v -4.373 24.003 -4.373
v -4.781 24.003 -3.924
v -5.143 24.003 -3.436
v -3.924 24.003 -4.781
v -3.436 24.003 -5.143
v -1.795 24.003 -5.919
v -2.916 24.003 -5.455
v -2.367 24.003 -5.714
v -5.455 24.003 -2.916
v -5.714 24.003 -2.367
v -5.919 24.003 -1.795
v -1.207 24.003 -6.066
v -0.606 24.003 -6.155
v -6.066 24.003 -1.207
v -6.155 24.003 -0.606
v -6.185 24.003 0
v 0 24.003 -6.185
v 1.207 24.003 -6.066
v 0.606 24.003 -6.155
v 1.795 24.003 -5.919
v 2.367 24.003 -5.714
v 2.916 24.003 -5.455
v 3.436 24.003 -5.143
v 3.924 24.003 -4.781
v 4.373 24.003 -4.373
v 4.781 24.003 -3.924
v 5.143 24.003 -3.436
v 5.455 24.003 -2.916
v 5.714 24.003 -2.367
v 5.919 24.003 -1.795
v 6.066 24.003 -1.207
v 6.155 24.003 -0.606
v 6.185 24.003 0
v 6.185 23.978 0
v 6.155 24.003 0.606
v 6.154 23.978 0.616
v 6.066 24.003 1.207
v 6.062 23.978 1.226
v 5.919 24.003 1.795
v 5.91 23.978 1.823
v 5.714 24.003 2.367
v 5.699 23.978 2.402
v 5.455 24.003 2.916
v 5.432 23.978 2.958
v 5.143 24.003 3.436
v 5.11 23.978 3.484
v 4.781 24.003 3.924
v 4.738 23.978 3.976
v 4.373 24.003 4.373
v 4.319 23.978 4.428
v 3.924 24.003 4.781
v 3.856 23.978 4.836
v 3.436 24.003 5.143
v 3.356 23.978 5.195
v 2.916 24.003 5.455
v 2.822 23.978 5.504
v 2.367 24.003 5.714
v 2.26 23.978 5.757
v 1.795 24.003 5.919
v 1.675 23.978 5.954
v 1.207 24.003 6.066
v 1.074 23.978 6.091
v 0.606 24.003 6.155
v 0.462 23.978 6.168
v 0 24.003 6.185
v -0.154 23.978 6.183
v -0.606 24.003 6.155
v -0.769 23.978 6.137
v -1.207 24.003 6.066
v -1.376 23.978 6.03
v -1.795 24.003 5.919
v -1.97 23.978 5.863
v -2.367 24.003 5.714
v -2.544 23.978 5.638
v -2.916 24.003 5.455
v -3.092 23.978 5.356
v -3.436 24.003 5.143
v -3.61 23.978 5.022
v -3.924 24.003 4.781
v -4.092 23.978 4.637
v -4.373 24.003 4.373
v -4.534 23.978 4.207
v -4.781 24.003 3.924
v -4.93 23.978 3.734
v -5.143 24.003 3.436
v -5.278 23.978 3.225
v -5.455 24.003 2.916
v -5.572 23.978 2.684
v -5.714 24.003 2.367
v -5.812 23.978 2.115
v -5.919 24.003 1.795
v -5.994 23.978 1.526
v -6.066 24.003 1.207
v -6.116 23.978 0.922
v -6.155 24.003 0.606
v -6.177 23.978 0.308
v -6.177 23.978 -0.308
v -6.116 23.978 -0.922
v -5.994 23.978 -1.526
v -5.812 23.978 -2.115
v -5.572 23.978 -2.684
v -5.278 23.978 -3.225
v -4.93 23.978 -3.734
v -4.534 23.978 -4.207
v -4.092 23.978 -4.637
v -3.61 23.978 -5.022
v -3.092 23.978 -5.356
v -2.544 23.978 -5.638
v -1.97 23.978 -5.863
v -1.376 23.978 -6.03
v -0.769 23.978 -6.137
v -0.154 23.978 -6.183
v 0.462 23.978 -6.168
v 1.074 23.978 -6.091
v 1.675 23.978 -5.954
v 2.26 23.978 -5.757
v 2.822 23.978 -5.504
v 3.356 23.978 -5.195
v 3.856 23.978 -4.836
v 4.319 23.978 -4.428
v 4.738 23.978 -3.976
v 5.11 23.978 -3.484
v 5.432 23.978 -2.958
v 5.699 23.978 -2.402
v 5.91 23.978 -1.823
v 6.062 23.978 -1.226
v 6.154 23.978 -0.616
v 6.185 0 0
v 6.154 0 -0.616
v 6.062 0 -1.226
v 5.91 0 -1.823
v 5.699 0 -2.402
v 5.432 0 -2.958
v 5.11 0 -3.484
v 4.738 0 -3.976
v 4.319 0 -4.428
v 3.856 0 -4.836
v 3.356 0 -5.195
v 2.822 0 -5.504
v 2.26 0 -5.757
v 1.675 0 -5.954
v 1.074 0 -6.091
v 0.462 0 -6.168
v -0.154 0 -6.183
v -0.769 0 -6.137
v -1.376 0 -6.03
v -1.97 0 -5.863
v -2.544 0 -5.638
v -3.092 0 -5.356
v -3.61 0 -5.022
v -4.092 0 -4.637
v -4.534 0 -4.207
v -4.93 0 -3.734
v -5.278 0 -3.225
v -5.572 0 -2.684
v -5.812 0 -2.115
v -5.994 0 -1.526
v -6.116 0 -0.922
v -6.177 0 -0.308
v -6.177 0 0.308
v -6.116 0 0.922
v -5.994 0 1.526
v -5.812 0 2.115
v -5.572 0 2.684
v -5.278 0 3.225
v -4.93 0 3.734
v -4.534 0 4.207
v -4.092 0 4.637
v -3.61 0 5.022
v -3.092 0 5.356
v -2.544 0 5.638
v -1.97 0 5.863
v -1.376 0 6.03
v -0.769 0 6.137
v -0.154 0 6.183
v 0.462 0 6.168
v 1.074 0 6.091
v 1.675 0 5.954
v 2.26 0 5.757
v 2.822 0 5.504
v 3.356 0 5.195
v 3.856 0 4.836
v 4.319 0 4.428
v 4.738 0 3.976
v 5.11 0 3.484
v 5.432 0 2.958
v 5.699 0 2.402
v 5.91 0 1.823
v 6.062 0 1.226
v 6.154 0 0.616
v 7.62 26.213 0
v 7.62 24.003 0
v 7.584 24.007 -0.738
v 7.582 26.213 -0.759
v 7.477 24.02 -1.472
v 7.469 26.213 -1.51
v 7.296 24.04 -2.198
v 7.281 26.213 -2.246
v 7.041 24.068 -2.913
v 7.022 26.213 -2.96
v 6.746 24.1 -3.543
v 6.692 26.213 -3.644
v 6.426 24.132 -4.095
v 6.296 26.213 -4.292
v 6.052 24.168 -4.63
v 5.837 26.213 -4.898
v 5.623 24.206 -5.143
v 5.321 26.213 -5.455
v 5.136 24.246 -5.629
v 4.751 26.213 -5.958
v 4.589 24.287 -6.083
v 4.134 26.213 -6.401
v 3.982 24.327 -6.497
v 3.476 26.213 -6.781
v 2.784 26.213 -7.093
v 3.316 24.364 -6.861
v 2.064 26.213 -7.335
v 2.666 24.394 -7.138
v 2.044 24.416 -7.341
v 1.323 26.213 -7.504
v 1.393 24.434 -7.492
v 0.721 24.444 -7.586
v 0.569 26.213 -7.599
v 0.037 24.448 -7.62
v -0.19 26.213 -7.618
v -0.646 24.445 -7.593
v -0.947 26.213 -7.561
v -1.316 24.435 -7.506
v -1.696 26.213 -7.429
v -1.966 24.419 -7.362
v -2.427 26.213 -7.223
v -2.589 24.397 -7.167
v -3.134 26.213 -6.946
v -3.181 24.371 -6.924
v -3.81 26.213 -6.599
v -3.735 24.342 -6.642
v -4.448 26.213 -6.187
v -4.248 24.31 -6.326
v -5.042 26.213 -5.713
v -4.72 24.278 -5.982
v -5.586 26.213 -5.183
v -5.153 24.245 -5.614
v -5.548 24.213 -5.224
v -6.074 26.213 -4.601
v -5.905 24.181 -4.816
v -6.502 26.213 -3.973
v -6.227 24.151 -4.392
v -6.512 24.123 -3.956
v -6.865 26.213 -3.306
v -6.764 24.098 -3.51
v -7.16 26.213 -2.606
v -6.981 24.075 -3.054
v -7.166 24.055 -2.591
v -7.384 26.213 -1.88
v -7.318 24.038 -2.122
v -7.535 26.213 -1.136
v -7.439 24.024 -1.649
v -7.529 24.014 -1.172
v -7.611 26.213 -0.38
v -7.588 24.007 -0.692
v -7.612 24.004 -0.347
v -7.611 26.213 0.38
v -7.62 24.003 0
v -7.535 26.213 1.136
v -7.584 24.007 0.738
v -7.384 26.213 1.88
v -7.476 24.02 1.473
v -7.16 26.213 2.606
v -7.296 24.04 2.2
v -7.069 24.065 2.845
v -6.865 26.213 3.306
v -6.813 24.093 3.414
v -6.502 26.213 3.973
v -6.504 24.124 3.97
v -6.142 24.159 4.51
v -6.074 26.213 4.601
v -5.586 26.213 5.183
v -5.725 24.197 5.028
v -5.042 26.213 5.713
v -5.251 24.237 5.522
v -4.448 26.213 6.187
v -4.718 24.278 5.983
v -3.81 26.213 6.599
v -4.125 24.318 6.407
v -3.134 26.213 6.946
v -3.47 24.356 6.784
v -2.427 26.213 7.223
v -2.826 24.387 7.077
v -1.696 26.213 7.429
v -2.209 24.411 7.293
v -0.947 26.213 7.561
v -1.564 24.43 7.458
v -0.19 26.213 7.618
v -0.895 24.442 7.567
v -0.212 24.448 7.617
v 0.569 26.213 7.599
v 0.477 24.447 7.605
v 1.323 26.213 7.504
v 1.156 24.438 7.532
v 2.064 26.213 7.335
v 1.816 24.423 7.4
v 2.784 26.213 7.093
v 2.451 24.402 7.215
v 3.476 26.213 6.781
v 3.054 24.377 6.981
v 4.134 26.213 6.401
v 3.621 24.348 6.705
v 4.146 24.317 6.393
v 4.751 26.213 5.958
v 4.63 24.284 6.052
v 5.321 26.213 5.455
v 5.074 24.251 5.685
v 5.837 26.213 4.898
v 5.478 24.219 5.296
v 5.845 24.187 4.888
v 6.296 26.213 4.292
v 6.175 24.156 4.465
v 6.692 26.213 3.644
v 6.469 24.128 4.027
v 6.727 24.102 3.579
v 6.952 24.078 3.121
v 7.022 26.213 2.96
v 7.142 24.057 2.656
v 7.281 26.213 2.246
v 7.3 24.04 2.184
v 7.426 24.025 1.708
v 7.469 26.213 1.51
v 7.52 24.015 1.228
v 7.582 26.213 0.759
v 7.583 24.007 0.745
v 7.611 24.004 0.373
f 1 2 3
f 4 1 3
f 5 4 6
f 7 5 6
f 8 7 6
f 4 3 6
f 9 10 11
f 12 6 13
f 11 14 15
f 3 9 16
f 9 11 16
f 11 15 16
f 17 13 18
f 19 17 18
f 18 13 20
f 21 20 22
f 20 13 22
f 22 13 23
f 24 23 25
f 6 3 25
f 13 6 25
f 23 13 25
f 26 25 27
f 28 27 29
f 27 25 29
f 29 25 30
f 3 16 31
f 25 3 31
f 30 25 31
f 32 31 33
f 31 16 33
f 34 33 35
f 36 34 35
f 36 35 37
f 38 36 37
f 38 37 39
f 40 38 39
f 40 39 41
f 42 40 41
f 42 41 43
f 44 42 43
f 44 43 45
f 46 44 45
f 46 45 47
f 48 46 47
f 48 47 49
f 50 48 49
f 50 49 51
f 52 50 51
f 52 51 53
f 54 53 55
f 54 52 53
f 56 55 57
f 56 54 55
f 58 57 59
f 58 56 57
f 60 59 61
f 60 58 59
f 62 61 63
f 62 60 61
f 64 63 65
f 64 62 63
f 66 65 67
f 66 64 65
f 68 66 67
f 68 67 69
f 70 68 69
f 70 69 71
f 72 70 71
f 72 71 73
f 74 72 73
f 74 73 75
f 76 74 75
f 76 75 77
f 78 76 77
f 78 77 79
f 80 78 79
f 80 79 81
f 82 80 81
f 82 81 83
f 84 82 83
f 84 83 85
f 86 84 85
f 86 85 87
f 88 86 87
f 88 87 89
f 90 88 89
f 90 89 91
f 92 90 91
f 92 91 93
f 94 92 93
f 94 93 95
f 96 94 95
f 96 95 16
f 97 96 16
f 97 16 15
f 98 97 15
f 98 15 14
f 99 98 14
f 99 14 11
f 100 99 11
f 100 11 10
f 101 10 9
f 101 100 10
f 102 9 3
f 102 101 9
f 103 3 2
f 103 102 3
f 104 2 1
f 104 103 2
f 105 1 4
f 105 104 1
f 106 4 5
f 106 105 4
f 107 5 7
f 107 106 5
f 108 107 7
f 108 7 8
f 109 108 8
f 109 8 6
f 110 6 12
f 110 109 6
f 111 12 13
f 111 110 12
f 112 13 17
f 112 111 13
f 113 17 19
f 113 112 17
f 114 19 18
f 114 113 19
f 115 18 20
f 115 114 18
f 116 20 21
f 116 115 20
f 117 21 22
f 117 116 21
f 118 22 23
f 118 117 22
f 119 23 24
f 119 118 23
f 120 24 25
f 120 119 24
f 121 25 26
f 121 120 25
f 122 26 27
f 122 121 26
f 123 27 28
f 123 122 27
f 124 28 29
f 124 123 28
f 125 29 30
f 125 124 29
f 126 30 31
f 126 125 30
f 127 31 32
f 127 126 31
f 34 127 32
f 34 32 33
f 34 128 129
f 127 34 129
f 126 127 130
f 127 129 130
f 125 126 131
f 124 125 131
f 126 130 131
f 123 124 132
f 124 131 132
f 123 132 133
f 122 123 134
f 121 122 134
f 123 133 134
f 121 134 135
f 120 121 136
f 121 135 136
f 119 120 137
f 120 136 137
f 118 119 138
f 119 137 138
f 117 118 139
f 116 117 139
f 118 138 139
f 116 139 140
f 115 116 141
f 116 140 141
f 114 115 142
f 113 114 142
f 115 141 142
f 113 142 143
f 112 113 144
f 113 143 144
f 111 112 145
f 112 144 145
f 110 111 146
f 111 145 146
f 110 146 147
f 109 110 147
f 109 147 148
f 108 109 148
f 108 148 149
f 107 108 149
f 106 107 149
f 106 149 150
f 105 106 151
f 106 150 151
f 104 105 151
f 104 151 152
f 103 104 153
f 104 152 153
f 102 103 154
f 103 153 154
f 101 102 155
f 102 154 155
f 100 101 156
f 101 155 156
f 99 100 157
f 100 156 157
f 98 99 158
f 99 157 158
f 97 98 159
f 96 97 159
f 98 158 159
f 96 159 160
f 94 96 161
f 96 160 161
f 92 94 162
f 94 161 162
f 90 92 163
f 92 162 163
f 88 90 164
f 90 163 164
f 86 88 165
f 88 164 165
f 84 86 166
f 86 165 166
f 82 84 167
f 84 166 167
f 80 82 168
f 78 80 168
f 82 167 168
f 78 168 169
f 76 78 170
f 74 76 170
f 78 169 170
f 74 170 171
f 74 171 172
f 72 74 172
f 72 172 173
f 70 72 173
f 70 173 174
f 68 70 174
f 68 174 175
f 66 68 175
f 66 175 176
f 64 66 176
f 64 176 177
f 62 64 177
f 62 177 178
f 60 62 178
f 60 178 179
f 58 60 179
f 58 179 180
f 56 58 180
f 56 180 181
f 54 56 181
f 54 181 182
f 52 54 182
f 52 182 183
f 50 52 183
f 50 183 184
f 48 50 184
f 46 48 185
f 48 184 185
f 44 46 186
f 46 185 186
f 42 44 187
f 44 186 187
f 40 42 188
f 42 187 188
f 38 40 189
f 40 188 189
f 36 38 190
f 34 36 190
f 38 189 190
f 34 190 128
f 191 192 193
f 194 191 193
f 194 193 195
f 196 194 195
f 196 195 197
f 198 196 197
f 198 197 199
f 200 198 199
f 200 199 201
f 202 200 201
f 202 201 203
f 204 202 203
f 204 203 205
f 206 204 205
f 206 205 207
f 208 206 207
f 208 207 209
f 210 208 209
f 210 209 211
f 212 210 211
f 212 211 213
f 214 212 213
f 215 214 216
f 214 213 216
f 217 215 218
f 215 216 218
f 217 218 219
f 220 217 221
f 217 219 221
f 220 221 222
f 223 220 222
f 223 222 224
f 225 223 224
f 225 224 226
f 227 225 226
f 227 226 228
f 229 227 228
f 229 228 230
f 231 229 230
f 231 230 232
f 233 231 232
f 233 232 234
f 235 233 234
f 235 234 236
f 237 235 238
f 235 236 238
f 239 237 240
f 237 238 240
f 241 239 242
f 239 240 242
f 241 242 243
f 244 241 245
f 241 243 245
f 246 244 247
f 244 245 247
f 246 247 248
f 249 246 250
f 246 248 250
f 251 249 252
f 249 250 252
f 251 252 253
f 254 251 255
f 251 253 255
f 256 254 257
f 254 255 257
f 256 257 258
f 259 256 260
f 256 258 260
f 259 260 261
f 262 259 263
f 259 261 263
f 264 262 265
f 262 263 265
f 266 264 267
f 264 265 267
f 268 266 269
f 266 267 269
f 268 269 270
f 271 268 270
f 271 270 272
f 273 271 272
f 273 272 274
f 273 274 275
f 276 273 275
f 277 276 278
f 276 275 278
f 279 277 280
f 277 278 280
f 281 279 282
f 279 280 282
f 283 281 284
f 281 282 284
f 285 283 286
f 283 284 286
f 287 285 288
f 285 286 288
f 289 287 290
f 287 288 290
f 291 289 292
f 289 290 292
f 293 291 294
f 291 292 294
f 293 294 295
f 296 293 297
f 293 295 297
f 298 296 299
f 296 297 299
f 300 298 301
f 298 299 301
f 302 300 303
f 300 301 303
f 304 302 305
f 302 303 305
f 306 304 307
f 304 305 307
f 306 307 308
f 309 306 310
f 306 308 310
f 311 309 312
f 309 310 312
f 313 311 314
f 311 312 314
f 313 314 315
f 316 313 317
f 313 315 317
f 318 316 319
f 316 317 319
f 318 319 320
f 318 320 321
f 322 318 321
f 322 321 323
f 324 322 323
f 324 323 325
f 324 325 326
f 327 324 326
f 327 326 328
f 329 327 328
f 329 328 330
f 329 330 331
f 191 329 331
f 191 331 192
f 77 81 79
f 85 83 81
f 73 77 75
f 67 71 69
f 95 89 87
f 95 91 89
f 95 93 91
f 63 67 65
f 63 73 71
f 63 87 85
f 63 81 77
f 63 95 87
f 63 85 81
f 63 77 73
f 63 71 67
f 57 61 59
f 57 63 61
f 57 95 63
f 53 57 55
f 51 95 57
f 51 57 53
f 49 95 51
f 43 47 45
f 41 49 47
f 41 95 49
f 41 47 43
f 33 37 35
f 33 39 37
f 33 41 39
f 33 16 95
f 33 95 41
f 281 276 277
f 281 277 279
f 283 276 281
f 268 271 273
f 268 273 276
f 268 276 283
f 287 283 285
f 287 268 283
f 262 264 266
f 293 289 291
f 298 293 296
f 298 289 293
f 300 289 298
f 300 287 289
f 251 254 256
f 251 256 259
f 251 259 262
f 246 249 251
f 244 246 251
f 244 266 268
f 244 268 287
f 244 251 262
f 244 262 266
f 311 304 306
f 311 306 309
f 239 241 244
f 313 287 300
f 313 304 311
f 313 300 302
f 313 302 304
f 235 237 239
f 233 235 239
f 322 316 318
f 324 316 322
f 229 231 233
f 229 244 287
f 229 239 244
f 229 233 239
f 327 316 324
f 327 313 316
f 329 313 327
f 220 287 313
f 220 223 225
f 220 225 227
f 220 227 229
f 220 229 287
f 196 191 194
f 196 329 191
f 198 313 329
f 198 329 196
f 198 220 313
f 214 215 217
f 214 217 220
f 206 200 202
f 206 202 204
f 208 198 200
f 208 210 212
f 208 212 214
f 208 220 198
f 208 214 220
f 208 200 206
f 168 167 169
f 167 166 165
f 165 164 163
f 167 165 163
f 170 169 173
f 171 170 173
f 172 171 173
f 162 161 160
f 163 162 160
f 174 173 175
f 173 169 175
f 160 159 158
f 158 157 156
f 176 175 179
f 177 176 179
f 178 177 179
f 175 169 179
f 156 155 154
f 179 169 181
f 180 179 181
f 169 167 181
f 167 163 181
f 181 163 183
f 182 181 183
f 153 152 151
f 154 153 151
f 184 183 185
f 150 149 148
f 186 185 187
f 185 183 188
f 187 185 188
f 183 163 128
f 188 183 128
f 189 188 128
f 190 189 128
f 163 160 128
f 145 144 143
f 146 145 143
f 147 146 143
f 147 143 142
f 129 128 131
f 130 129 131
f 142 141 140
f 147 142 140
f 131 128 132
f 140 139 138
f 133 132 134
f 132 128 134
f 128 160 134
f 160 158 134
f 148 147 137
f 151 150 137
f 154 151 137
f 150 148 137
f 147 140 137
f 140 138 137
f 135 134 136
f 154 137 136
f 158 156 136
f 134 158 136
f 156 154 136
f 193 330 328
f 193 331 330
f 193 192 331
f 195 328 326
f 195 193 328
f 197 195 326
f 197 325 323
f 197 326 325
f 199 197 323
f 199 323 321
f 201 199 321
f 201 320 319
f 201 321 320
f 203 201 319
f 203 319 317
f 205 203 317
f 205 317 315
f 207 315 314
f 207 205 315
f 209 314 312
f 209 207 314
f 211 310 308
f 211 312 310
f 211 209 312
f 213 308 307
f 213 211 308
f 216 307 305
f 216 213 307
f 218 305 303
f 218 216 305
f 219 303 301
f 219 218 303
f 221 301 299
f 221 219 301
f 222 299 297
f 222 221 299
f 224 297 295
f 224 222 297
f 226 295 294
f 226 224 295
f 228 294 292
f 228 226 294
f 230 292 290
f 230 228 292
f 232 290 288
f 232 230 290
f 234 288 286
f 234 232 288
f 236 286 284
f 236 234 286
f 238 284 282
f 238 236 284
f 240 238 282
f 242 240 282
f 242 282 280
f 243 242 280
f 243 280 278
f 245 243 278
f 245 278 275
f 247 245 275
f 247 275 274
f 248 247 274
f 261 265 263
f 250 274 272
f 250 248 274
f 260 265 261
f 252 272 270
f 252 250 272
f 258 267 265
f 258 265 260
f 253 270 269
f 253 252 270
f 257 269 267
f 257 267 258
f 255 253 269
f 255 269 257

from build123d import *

# Parameters (mm, degrees)
SKETCH1_R               = 6.1849
BOSS_EXTRUDE1_DEPTH     = 23.9776
SKETCH2_R               = 7.62
BOSS_EXTRUDE2_DEPTH     = 2.2352
SKETCH4_R               = 7.62
SKETCH4_R_2             = 6.1849
CUT_EXTRUDE2_DEPTH      = 24.9776
CUT_EXTRUDE2_DEPTH_BACK = 0.0254
CUT_EXTRUDE3_DEPTH      = 8.62
CUT_EXTRUDE3_DEPTH_BACK = 8.62


with BuildPart() as part:
    # Sketch1 → Boss-Extrude1 (new body)
    with BuildSketch(Plane(origin=(0, 0, 0), x_dir=(1, 0, 0), z_dir=(0, 1, 0))):
        Circle(SKETCH1_R)
    extrude(amount=BOSS_EXTRUDE1_DEPTH)

    # Sketch2 → Boss-Extrude2 (add)
    with BuildSketch(Plane(origin=(0, 23.9776, 0), x_dir=(1, 0, 0), z_dir=(0, 1, 0))):
        Circle(SKETCH2_R)
    extrude(amount=BOSS_EXTRUDE2_DEPTH)

    # Sketch4 → Cut-Extrude2 (cut, two sides)
    with BuildSketch(Plane.XZ.offset(-23.9776)) as cut_extrude2_sk:
        Circle(SKETCH4_R)
        Circle(SKETCH4_R_2, mode=Mode.SUBTRACT)
    extrude(amount=CUT_EXTRUDE2_DEPTH, mode=Mode.SUBTRACT)
    extrude(cut_extrude2_sk.sketch, amount=-CUT_EXTRUDE2_DEPTH_BACK, mode=Mode.SUBTRACT)

    # Sketch8 → Cut-Extrude3 (cut, two sides)
    with BuildSketch(Plane.XY) as cut_extrude3_sk:
        with BuildLine():
            Line((-7.62, 24.003), (7.62, 24.003))
            ThreePointArc((7.62, 24.003), (0, 24.448400055), (-7.62, 24.003))
        make_face()
    extrude(amount=CUT_EXTRUDE3_DEPTH, mode=Mode.SUBTRACT)
    extrude(cut_extrude3_sk.sketch, amount=-CUT_EXTRUDE3_DEPTH_BACK, mode=Mode.SUBTRACT)


solid = part.part
